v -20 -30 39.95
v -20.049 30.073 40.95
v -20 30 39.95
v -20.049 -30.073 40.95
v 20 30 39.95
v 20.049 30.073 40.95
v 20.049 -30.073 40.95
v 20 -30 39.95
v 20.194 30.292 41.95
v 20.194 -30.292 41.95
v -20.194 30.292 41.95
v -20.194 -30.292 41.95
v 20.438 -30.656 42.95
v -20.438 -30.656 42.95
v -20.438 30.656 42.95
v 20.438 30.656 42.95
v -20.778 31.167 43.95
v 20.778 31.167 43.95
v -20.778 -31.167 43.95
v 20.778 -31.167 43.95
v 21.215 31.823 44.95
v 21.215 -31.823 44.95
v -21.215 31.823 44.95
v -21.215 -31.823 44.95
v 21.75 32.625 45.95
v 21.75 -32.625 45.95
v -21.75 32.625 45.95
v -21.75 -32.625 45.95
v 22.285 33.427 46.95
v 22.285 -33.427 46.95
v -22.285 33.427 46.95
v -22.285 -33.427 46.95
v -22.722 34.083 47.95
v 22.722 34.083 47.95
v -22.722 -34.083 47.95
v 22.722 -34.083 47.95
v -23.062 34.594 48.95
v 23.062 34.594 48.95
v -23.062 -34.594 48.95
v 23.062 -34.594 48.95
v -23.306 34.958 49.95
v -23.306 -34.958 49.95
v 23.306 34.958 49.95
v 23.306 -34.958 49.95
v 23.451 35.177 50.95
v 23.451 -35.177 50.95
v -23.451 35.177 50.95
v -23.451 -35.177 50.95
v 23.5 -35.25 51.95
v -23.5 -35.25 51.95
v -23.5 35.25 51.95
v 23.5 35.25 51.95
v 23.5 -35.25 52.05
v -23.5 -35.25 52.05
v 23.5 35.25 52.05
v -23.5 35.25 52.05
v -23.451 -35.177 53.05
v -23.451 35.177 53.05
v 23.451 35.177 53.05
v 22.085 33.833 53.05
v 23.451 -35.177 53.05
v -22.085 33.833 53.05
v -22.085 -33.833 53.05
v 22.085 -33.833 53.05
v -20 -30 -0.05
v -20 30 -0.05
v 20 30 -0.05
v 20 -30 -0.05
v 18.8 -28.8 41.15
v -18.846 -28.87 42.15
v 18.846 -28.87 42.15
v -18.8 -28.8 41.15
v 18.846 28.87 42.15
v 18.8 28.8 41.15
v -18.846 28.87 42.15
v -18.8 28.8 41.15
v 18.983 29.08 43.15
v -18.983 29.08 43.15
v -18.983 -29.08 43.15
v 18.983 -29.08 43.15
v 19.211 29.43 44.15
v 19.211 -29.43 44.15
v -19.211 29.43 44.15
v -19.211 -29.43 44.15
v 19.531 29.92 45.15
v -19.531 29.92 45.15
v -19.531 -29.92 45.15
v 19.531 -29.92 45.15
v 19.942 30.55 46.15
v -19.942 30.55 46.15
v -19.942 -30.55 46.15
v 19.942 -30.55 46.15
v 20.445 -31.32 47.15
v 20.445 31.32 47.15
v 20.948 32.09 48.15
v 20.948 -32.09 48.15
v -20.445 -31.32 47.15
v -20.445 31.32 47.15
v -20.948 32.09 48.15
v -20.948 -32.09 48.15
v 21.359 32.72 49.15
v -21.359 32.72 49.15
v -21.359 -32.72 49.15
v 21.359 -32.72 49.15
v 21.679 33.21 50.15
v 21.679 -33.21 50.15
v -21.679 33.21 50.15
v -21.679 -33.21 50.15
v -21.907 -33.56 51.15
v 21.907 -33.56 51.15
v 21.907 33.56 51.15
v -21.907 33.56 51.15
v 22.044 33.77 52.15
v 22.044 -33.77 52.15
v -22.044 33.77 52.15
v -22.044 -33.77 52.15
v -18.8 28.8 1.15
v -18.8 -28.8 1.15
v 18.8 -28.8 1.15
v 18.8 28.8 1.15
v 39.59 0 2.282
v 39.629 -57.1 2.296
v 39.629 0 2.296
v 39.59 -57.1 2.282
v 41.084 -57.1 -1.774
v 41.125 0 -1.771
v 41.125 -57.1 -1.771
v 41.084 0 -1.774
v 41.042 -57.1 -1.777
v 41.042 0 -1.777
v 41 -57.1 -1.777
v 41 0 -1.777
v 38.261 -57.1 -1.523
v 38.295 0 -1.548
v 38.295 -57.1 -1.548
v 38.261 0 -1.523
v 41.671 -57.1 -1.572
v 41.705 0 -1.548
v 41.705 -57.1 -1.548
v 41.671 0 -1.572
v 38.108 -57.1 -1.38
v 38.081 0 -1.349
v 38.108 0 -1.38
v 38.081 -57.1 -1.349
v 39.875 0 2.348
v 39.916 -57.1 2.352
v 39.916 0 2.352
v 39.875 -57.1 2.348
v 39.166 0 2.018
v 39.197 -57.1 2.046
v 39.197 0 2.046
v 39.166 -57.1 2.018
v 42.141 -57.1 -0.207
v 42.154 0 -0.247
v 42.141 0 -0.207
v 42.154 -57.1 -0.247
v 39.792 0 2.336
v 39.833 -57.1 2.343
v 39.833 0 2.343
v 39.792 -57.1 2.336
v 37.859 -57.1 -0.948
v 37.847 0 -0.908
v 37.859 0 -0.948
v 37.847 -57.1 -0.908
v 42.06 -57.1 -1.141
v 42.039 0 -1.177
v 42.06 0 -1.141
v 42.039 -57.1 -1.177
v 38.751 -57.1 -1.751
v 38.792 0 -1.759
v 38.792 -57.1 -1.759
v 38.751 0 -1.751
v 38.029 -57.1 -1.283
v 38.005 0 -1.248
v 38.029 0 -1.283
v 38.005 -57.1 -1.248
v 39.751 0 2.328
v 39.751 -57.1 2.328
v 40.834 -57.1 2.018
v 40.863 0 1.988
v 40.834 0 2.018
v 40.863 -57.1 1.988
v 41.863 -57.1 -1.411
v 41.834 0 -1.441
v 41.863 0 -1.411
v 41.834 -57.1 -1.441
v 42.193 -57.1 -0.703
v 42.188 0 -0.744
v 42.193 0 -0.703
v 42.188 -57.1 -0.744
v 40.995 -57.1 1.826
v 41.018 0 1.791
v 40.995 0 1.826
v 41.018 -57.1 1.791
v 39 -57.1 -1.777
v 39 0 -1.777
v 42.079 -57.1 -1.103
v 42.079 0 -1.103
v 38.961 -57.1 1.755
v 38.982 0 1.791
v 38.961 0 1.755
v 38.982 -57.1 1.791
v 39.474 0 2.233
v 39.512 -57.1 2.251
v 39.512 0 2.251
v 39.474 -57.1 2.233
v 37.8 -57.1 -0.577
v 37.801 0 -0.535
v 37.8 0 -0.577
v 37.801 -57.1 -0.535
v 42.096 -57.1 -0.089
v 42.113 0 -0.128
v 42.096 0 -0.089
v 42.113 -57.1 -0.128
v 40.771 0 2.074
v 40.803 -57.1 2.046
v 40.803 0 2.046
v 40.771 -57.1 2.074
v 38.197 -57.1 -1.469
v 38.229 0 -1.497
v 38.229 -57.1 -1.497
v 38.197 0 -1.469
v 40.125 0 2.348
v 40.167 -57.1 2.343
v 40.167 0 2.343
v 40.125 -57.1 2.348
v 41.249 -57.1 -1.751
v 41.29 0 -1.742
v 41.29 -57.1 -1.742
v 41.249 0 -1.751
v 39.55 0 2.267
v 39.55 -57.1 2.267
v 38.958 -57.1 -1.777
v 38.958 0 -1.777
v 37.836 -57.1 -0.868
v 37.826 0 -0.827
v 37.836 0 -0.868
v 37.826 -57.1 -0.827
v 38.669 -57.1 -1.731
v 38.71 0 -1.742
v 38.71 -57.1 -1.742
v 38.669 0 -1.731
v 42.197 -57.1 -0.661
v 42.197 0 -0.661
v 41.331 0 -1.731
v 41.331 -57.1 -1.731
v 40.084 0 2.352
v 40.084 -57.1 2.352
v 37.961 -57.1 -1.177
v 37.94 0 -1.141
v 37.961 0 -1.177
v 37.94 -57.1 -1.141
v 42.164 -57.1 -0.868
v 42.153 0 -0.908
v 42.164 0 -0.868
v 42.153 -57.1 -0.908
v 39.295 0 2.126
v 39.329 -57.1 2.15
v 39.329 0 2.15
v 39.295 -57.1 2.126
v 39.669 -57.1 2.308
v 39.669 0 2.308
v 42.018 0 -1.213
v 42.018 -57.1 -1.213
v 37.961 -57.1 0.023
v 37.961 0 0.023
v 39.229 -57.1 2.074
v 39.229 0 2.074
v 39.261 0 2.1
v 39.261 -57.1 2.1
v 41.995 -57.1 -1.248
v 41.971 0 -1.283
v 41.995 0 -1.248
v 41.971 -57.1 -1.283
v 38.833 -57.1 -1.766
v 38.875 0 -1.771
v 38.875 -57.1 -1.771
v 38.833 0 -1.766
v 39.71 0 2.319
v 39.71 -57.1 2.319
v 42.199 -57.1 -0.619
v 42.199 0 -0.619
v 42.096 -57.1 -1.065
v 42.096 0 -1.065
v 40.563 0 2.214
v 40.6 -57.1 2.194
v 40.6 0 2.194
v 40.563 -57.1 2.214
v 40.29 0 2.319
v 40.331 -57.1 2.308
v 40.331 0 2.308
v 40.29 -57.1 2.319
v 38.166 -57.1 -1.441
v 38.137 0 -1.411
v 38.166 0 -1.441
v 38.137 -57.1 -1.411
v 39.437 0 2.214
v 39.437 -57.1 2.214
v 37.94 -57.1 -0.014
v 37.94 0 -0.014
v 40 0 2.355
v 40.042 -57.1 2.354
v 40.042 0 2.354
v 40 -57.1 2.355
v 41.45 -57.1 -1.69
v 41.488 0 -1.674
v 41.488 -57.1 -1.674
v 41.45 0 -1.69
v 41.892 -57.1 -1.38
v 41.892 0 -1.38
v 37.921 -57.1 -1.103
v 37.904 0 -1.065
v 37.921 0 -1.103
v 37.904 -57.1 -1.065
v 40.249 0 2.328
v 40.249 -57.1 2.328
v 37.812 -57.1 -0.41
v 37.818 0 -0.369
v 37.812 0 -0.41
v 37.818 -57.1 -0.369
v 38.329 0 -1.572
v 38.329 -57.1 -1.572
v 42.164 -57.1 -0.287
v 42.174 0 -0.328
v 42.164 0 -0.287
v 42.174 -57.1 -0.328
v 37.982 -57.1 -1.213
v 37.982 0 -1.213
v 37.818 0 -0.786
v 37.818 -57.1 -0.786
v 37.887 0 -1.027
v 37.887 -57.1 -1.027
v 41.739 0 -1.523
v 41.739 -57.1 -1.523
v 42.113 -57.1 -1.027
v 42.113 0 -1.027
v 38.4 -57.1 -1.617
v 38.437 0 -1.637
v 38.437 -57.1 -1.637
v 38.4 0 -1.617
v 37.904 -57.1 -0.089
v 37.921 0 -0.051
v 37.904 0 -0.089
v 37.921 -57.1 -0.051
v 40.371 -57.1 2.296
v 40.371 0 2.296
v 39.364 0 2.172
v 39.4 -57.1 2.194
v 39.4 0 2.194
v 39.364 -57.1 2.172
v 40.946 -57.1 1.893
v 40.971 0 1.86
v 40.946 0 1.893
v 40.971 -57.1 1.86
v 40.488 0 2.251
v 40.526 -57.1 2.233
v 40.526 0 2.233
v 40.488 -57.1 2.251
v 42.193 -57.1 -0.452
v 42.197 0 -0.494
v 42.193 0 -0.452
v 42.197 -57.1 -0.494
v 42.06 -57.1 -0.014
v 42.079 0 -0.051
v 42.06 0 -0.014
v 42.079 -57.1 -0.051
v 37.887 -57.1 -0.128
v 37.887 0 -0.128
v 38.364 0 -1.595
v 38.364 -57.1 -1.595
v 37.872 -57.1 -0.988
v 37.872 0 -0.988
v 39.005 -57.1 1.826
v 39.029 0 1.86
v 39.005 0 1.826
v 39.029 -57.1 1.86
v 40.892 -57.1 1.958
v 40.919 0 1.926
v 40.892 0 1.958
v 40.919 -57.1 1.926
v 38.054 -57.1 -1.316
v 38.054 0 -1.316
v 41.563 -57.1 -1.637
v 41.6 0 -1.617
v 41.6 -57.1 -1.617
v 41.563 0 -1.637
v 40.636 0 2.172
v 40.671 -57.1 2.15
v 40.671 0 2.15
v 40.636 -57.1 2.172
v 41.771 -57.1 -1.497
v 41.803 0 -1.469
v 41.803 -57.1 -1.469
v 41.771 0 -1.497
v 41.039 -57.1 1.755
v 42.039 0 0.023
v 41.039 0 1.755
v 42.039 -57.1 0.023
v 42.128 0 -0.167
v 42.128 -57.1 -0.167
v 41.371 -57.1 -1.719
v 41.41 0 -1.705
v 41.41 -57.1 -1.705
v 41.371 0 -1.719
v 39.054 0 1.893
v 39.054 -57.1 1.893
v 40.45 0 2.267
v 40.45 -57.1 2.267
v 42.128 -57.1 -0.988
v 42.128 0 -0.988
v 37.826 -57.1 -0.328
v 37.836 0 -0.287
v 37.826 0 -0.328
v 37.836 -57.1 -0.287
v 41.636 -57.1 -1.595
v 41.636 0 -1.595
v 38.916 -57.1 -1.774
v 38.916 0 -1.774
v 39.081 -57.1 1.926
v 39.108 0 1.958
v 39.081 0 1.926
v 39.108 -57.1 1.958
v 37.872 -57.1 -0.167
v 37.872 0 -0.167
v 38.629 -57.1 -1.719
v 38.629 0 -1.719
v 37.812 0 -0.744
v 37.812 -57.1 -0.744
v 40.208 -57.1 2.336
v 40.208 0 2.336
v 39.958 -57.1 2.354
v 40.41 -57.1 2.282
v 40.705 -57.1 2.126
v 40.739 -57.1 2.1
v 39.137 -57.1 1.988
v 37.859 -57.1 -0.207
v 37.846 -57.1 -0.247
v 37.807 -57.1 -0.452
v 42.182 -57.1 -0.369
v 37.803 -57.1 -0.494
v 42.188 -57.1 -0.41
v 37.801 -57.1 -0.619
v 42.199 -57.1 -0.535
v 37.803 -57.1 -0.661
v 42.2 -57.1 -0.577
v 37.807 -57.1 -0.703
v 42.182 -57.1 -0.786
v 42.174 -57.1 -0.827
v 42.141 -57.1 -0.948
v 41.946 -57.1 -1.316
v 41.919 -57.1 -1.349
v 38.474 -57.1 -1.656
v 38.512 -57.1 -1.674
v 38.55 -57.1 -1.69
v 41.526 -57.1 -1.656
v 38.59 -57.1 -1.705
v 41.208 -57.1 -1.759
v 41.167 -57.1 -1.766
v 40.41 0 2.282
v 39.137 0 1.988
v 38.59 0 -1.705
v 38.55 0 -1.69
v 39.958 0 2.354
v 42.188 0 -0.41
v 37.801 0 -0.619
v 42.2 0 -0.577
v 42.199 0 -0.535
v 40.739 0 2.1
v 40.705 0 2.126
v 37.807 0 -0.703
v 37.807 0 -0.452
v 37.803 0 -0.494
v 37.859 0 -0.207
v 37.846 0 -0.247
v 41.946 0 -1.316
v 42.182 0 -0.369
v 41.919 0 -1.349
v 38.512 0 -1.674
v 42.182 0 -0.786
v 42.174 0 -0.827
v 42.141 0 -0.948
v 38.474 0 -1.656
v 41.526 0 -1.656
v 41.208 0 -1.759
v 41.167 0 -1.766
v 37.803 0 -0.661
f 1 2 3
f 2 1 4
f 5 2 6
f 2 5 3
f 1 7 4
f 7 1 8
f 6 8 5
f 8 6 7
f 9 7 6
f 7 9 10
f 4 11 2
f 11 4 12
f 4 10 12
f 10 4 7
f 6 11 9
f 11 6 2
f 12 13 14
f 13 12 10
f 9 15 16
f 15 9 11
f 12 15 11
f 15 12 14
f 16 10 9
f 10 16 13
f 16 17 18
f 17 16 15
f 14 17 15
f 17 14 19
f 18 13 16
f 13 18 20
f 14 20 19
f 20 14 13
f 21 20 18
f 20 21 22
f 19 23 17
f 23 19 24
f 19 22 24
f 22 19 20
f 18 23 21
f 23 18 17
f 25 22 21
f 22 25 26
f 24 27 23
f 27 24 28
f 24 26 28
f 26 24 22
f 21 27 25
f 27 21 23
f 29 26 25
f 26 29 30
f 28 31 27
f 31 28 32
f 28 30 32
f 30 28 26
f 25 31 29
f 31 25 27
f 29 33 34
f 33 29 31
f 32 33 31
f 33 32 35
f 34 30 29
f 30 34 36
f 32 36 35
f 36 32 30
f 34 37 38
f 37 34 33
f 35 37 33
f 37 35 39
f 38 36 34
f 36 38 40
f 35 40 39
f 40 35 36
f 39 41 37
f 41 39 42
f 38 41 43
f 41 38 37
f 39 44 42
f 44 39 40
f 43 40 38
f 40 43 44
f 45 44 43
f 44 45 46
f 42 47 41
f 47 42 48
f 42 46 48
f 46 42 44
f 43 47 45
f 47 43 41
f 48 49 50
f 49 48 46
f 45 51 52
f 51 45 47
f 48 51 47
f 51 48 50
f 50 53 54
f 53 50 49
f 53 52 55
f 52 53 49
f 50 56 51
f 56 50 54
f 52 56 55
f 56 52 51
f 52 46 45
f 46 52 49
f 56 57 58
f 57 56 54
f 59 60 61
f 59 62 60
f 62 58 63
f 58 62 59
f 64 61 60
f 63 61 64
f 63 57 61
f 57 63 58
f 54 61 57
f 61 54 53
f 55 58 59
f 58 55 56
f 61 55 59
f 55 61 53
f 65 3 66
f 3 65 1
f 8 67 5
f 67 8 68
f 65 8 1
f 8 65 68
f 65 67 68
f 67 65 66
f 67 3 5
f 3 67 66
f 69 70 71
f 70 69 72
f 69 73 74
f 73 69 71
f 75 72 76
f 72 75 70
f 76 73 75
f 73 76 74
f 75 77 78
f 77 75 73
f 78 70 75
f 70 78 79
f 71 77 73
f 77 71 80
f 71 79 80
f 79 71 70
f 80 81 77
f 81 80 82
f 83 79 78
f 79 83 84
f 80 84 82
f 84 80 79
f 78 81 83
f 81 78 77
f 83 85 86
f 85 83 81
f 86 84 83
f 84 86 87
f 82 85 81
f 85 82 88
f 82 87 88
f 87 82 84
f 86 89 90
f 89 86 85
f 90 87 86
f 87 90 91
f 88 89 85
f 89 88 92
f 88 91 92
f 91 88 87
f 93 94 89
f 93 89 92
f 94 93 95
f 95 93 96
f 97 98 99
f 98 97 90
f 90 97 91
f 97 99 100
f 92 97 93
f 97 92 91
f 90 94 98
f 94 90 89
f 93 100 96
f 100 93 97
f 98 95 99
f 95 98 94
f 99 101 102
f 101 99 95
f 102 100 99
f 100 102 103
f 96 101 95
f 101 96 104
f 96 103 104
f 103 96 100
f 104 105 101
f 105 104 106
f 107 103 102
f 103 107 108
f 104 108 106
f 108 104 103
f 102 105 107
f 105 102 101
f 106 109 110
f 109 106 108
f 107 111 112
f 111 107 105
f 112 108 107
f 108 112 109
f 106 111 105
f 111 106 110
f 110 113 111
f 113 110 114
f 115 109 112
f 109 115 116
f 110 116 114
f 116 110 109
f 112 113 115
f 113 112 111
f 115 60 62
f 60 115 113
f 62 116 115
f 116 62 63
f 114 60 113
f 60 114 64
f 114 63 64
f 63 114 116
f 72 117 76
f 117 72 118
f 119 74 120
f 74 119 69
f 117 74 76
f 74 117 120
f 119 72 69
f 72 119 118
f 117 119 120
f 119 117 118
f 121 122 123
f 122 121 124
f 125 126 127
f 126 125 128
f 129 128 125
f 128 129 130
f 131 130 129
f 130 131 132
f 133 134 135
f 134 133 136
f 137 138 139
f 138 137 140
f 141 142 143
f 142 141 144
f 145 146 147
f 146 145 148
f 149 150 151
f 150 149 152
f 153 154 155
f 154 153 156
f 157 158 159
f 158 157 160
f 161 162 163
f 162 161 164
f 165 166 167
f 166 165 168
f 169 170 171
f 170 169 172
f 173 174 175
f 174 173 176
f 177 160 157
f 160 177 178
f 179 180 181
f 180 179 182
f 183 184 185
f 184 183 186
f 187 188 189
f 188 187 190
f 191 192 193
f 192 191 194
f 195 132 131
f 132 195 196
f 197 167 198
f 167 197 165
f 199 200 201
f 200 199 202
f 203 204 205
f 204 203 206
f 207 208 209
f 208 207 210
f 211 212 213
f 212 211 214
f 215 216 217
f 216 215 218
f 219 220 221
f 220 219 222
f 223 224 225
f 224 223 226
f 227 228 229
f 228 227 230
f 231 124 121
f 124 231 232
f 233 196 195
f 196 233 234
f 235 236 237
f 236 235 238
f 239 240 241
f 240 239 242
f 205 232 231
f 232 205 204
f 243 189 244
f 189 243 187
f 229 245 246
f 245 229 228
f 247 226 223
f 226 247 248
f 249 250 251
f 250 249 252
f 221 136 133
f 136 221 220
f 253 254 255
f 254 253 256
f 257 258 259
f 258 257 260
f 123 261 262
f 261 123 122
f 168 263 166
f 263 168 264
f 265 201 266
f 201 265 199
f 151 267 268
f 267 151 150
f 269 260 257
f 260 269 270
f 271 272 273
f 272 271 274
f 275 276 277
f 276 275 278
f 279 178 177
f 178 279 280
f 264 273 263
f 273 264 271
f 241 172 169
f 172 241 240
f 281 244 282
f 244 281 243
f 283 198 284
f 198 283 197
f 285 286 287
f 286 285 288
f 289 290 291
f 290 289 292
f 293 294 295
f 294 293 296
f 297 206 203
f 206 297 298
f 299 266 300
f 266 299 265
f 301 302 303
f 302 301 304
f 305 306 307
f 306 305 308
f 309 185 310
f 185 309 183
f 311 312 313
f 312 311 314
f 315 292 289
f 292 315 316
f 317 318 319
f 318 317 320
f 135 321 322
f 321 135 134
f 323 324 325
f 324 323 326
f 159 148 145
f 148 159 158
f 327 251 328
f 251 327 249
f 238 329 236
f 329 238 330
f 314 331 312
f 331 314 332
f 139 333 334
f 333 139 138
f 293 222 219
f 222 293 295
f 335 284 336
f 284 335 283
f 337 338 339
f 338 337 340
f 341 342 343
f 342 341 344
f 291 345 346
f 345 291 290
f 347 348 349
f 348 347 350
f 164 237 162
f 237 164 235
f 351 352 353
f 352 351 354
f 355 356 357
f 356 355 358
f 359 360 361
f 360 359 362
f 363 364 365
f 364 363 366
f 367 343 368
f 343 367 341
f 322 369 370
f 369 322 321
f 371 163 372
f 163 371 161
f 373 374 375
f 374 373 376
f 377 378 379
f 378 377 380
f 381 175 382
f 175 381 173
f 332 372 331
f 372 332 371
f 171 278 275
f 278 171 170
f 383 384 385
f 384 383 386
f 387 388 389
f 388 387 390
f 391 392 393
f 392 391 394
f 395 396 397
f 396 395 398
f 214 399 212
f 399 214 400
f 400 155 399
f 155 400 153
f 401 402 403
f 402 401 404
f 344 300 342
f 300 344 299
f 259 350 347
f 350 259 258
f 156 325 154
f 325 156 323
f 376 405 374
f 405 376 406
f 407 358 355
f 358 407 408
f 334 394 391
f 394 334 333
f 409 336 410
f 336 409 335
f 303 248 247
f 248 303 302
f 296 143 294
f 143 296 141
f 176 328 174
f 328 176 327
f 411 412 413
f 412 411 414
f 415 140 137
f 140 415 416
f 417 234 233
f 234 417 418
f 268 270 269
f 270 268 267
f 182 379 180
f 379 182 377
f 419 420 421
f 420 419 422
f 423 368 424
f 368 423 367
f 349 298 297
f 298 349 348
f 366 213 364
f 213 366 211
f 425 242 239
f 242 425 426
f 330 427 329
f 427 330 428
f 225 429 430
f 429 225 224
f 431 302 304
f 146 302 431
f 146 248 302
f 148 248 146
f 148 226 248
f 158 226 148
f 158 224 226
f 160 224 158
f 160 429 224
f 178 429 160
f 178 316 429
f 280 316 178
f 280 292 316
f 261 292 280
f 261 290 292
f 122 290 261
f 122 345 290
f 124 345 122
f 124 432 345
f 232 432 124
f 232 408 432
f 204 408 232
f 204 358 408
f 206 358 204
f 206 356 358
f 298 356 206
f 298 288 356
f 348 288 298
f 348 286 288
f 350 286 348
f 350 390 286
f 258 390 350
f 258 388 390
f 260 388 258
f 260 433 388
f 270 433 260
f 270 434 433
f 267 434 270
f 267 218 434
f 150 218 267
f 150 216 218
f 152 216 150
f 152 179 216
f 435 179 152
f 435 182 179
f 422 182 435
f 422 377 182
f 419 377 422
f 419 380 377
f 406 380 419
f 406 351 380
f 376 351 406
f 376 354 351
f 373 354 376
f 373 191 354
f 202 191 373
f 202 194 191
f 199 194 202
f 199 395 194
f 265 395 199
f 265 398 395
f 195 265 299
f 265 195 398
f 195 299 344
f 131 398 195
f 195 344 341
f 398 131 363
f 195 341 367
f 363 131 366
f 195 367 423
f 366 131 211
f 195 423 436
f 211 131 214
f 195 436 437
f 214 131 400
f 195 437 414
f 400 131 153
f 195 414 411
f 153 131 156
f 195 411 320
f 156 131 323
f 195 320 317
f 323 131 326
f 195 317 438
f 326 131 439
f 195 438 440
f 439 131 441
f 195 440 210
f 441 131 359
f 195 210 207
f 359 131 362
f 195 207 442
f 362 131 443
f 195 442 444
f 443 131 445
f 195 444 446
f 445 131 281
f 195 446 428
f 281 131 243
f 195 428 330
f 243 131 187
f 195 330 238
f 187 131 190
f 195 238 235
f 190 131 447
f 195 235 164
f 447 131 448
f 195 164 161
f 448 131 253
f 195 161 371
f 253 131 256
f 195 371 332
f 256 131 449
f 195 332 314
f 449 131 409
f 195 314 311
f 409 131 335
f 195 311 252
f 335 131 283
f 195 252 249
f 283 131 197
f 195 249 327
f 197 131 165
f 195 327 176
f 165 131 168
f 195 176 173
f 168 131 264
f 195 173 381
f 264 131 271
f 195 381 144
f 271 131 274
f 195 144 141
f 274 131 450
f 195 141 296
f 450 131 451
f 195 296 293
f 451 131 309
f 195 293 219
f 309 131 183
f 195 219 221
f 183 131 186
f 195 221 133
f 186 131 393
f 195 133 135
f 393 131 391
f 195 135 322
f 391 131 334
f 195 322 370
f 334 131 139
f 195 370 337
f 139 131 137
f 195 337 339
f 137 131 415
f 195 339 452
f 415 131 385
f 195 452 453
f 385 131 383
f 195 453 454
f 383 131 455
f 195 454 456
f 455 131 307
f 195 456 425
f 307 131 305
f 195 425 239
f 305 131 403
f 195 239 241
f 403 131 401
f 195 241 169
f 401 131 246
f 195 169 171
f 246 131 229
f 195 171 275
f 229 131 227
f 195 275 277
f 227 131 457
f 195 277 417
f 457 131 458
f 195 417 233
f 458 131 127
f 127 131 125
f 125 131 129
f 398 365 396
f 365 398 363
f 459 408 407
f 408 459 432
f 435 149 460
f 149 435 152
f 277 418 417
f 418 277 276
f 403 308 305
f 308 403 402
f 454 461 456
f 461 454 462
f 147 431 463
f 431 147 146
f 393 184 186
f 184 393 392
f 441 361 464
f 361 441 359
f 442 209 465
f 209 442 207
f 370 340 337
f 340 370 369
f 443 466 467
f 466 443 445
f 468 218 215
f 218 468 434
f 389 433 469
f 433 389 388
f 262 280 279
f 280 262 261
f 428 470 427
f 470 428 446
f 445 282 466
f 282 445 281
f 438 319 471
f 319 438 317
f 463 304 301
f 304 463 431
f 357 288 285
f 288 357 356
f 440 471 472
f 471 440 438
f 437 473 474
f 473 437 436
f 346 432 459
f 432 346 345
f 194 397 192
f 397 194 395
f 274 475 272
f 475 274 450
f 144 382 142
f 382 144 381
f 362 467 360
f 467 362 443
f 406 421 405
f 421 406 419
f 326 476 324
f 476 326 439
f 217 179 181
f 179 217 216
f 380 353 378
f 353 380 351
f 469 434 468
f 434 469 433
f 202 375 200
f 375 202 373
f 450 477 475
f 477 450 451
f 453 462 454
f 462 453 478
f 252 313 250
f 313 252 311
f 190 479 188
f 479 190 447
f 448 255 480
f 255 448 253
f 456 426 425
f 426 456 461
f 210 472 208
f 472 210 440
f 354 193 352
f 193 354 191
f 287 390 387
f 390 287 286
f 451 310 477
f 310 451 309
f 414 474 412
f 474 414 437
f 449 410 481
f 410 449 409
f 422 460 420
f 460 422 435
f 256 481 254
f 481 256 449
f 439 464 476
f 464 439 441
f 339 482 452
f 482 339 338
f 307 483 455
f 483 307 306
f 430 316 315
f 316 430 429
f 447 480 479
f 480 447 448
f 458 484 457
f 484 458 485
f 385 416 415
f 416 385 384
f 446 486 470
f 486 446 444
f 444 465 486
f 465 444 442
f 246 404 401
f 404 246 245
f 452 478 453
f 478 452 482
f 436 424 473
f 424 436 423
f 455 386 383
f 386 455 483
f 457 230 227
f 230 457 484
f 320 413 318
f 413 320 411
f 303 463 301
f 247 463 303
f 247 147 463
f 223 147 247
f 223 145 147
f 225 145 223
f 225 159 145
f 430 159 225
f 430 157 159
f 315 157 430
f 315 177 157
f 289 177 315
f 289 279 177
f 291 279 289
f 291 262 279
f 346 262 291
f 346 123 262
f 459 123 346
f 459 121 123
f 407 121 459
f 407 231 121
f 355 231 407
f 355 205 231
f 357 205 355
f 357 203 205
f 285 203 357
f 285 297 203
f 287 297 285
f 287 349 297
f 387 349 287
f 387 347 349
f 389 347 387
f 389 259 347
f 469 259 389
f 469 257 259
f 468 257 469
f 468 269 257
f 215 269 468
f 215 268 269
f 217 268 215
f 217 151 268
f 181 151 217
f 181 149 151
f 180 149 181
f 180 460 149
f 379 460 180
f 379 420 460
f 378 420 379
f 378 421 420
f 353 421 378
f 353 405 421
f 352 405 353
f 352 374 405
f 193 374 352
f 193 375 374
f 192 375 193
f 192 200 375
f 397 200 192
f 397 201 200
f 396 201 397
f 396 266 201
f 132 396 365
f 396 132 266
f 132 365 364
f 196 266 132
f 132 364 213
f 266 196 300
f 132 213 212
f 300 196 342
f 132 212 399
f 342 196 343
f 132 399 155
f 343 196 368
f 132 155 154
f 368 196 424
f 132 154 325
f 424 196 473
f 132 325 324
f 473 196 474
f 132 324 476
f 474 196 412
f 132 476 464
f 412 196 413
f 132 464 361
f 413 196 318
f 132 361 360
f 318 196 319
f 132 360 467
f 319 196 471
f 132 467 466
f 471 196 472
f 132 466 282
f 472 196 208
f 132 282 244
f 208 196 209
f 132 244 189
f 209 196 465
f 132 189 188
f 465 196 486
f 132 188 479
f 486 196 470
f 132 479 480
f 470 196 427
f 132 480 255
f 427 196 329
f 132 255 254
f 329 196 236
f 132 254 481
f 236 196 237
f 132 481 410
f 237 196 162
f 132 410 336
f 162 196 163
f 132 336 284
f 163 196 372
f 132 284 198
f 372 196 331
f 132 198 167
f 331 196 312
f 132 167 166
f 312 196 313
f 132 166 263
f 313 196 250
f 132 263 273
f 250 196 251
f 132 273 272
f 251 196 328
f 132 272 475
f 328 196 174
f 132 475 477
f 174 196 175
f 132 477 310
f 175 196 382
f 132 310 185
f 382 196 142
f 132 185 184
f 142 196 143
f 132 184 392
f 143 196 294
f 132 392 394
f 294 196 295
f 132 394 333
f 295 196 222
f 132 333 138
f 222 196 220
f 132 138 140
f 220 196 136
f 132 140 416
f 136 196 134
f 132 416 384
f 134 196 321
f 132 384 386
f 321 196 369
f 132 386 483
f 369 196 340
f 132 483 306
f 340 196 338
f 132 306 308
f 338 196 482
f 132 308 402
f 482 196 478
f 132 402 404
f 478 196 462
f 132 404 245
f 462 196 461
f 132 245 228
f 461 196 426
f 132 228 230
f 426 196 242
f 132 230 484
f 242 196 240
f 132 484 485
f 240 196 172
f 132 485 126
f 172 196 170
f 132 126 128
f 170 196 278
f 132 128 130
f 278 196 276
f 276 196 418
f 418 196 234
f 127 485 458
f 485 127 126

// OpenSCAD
// file: stick.scad
// triangle base width including rounding
size = 1;
// radius of the edge rounding
rounding = .100;

// right side of the top third triangle section
module section(size, rounding) {
    //triangle side length w/o rounding
    side = (size - rounding*2) + rounding/tan(30) * 2;
    // triangle height w/o rounding
    height = sqrt(3)/2 * side;
    // triangle center
    ox = 0;
    oy = 0;
    // length of the line from the center to a side (perpendicular)
    oa = sqrt(3)/3 * side/2;
    // point on the middle of the right side
    ax = ox + cos(30) * oa;
    ay = oy + sin(30) * oa;
    // length from triangle center to a corner
    raw_height = side*sqrt(3)/3;
    rounding_center = raw_height - rounding * 2;
    echo("rounding_center", rounding_center);
    arc = [for (i=[30:2:90]) [
        cos(i)*rounding, 
        rounding_center + sin(i)*rounding
    ]];
    polygon(concat([[ox,oy],[ax,ay]], arc));
}
module third(size, rounding) {
    section(size, rounding);
    mirror([1,0,0])
    section(size, rounding);
}

module stick_profile(size, rounding) {
    for (i = [0,120,240]) {
        rotate([0,0,i])
        third(size, rounding);
    }
}

module stick(width, rounding, length) {
    linear_extrude(length)
    stick_profile(width, rounding);
}


stick(size, rounding, 5);
// main file
use <stick.scad>;
$fn=100;
width = 40;
depth = 60;
height = 40;
stick_count = 8;
wall_width = 1.2;
ledge_width = 2.5;
ledge_height = 25;
rim_height = 12;
rim_bloat = 7;

ww2 = wall_width*2;





//module box() {
//    difference() {
//        cube([width, depth, height], center = true);
//        translate([0,0,wall_width])
//    cube([width - ww2, depth - ledge_width*2, height], center = true);
//        translate([0,0,ledge_height])
//        cube([width - ww2, depth - ww2, height], center = true);
//    };    
//}

rotate([90,0,0])
translate([width,0,0])
stick((width-(ww2+0.3*stick_count)) / stick_count,1.2,depth - ww2 - 0.5);

//box();
//linear_extrude(height=30)
//linear_extrude(height=height)
//square([width, depth], center=true);

module footprint() {
    cube([width, depth, 0.1], center=true);
}

module inner_footprint() {
    cube([width-wall_width*2, depth-wall_width*2, 0.1], center=true);
}

module box() {
    hull() {
        translate([0,0,height])
        children();
        children();
    }



    rim_start = height;
    rim_end = rim_start + rim_height;
    step_size = 1;
    function f(i) = 1+ pow((i-rim_start) / rim_height,2); 
    function easeInOutQuad(x) = x < 0.5 ? 2 * x * x : 1 - pow(-2 * x + 2, 2) / 2;
    function rim_profile(h) = easeInOutQuad((h-rim_start) / rim_height);
    function rim_profile_scale(h) = [1,1] + rim_profile(h) * [(width+rim_bloat)/width-1, (height+rim_bloat)/height-1];

    for(i=[rim_start:step_size:rim_end]) {
        echo("III", i, rim_profile(i))
        hull() {
            translate([0,0,i])
            scale(rim_profile_scale(i))
            children();
            translate([0,0,i+step_size])
            scale(rim_profile_scale(i+step_size))
            children();
        }
    }
}

difference() {
    box()
    footprint();
    
    translate([0,0,wall_width])
    box()
    inner_footprint();
}


//step = 10;
//for (i=[0:step:153])
//hull()
//{
//  translate([0, 0, i])
//    scale(f(i)*[1,1.19255])
//      cylinder(r=161/2, h = .01);
//  translate([0, 0, i+step])
//    scale(f(i+step)*[1,1.19255])
//      cylinder(r=161/2, h = .01);
//}
//
//function f(i) = 1+ pow(i/200,2); 
